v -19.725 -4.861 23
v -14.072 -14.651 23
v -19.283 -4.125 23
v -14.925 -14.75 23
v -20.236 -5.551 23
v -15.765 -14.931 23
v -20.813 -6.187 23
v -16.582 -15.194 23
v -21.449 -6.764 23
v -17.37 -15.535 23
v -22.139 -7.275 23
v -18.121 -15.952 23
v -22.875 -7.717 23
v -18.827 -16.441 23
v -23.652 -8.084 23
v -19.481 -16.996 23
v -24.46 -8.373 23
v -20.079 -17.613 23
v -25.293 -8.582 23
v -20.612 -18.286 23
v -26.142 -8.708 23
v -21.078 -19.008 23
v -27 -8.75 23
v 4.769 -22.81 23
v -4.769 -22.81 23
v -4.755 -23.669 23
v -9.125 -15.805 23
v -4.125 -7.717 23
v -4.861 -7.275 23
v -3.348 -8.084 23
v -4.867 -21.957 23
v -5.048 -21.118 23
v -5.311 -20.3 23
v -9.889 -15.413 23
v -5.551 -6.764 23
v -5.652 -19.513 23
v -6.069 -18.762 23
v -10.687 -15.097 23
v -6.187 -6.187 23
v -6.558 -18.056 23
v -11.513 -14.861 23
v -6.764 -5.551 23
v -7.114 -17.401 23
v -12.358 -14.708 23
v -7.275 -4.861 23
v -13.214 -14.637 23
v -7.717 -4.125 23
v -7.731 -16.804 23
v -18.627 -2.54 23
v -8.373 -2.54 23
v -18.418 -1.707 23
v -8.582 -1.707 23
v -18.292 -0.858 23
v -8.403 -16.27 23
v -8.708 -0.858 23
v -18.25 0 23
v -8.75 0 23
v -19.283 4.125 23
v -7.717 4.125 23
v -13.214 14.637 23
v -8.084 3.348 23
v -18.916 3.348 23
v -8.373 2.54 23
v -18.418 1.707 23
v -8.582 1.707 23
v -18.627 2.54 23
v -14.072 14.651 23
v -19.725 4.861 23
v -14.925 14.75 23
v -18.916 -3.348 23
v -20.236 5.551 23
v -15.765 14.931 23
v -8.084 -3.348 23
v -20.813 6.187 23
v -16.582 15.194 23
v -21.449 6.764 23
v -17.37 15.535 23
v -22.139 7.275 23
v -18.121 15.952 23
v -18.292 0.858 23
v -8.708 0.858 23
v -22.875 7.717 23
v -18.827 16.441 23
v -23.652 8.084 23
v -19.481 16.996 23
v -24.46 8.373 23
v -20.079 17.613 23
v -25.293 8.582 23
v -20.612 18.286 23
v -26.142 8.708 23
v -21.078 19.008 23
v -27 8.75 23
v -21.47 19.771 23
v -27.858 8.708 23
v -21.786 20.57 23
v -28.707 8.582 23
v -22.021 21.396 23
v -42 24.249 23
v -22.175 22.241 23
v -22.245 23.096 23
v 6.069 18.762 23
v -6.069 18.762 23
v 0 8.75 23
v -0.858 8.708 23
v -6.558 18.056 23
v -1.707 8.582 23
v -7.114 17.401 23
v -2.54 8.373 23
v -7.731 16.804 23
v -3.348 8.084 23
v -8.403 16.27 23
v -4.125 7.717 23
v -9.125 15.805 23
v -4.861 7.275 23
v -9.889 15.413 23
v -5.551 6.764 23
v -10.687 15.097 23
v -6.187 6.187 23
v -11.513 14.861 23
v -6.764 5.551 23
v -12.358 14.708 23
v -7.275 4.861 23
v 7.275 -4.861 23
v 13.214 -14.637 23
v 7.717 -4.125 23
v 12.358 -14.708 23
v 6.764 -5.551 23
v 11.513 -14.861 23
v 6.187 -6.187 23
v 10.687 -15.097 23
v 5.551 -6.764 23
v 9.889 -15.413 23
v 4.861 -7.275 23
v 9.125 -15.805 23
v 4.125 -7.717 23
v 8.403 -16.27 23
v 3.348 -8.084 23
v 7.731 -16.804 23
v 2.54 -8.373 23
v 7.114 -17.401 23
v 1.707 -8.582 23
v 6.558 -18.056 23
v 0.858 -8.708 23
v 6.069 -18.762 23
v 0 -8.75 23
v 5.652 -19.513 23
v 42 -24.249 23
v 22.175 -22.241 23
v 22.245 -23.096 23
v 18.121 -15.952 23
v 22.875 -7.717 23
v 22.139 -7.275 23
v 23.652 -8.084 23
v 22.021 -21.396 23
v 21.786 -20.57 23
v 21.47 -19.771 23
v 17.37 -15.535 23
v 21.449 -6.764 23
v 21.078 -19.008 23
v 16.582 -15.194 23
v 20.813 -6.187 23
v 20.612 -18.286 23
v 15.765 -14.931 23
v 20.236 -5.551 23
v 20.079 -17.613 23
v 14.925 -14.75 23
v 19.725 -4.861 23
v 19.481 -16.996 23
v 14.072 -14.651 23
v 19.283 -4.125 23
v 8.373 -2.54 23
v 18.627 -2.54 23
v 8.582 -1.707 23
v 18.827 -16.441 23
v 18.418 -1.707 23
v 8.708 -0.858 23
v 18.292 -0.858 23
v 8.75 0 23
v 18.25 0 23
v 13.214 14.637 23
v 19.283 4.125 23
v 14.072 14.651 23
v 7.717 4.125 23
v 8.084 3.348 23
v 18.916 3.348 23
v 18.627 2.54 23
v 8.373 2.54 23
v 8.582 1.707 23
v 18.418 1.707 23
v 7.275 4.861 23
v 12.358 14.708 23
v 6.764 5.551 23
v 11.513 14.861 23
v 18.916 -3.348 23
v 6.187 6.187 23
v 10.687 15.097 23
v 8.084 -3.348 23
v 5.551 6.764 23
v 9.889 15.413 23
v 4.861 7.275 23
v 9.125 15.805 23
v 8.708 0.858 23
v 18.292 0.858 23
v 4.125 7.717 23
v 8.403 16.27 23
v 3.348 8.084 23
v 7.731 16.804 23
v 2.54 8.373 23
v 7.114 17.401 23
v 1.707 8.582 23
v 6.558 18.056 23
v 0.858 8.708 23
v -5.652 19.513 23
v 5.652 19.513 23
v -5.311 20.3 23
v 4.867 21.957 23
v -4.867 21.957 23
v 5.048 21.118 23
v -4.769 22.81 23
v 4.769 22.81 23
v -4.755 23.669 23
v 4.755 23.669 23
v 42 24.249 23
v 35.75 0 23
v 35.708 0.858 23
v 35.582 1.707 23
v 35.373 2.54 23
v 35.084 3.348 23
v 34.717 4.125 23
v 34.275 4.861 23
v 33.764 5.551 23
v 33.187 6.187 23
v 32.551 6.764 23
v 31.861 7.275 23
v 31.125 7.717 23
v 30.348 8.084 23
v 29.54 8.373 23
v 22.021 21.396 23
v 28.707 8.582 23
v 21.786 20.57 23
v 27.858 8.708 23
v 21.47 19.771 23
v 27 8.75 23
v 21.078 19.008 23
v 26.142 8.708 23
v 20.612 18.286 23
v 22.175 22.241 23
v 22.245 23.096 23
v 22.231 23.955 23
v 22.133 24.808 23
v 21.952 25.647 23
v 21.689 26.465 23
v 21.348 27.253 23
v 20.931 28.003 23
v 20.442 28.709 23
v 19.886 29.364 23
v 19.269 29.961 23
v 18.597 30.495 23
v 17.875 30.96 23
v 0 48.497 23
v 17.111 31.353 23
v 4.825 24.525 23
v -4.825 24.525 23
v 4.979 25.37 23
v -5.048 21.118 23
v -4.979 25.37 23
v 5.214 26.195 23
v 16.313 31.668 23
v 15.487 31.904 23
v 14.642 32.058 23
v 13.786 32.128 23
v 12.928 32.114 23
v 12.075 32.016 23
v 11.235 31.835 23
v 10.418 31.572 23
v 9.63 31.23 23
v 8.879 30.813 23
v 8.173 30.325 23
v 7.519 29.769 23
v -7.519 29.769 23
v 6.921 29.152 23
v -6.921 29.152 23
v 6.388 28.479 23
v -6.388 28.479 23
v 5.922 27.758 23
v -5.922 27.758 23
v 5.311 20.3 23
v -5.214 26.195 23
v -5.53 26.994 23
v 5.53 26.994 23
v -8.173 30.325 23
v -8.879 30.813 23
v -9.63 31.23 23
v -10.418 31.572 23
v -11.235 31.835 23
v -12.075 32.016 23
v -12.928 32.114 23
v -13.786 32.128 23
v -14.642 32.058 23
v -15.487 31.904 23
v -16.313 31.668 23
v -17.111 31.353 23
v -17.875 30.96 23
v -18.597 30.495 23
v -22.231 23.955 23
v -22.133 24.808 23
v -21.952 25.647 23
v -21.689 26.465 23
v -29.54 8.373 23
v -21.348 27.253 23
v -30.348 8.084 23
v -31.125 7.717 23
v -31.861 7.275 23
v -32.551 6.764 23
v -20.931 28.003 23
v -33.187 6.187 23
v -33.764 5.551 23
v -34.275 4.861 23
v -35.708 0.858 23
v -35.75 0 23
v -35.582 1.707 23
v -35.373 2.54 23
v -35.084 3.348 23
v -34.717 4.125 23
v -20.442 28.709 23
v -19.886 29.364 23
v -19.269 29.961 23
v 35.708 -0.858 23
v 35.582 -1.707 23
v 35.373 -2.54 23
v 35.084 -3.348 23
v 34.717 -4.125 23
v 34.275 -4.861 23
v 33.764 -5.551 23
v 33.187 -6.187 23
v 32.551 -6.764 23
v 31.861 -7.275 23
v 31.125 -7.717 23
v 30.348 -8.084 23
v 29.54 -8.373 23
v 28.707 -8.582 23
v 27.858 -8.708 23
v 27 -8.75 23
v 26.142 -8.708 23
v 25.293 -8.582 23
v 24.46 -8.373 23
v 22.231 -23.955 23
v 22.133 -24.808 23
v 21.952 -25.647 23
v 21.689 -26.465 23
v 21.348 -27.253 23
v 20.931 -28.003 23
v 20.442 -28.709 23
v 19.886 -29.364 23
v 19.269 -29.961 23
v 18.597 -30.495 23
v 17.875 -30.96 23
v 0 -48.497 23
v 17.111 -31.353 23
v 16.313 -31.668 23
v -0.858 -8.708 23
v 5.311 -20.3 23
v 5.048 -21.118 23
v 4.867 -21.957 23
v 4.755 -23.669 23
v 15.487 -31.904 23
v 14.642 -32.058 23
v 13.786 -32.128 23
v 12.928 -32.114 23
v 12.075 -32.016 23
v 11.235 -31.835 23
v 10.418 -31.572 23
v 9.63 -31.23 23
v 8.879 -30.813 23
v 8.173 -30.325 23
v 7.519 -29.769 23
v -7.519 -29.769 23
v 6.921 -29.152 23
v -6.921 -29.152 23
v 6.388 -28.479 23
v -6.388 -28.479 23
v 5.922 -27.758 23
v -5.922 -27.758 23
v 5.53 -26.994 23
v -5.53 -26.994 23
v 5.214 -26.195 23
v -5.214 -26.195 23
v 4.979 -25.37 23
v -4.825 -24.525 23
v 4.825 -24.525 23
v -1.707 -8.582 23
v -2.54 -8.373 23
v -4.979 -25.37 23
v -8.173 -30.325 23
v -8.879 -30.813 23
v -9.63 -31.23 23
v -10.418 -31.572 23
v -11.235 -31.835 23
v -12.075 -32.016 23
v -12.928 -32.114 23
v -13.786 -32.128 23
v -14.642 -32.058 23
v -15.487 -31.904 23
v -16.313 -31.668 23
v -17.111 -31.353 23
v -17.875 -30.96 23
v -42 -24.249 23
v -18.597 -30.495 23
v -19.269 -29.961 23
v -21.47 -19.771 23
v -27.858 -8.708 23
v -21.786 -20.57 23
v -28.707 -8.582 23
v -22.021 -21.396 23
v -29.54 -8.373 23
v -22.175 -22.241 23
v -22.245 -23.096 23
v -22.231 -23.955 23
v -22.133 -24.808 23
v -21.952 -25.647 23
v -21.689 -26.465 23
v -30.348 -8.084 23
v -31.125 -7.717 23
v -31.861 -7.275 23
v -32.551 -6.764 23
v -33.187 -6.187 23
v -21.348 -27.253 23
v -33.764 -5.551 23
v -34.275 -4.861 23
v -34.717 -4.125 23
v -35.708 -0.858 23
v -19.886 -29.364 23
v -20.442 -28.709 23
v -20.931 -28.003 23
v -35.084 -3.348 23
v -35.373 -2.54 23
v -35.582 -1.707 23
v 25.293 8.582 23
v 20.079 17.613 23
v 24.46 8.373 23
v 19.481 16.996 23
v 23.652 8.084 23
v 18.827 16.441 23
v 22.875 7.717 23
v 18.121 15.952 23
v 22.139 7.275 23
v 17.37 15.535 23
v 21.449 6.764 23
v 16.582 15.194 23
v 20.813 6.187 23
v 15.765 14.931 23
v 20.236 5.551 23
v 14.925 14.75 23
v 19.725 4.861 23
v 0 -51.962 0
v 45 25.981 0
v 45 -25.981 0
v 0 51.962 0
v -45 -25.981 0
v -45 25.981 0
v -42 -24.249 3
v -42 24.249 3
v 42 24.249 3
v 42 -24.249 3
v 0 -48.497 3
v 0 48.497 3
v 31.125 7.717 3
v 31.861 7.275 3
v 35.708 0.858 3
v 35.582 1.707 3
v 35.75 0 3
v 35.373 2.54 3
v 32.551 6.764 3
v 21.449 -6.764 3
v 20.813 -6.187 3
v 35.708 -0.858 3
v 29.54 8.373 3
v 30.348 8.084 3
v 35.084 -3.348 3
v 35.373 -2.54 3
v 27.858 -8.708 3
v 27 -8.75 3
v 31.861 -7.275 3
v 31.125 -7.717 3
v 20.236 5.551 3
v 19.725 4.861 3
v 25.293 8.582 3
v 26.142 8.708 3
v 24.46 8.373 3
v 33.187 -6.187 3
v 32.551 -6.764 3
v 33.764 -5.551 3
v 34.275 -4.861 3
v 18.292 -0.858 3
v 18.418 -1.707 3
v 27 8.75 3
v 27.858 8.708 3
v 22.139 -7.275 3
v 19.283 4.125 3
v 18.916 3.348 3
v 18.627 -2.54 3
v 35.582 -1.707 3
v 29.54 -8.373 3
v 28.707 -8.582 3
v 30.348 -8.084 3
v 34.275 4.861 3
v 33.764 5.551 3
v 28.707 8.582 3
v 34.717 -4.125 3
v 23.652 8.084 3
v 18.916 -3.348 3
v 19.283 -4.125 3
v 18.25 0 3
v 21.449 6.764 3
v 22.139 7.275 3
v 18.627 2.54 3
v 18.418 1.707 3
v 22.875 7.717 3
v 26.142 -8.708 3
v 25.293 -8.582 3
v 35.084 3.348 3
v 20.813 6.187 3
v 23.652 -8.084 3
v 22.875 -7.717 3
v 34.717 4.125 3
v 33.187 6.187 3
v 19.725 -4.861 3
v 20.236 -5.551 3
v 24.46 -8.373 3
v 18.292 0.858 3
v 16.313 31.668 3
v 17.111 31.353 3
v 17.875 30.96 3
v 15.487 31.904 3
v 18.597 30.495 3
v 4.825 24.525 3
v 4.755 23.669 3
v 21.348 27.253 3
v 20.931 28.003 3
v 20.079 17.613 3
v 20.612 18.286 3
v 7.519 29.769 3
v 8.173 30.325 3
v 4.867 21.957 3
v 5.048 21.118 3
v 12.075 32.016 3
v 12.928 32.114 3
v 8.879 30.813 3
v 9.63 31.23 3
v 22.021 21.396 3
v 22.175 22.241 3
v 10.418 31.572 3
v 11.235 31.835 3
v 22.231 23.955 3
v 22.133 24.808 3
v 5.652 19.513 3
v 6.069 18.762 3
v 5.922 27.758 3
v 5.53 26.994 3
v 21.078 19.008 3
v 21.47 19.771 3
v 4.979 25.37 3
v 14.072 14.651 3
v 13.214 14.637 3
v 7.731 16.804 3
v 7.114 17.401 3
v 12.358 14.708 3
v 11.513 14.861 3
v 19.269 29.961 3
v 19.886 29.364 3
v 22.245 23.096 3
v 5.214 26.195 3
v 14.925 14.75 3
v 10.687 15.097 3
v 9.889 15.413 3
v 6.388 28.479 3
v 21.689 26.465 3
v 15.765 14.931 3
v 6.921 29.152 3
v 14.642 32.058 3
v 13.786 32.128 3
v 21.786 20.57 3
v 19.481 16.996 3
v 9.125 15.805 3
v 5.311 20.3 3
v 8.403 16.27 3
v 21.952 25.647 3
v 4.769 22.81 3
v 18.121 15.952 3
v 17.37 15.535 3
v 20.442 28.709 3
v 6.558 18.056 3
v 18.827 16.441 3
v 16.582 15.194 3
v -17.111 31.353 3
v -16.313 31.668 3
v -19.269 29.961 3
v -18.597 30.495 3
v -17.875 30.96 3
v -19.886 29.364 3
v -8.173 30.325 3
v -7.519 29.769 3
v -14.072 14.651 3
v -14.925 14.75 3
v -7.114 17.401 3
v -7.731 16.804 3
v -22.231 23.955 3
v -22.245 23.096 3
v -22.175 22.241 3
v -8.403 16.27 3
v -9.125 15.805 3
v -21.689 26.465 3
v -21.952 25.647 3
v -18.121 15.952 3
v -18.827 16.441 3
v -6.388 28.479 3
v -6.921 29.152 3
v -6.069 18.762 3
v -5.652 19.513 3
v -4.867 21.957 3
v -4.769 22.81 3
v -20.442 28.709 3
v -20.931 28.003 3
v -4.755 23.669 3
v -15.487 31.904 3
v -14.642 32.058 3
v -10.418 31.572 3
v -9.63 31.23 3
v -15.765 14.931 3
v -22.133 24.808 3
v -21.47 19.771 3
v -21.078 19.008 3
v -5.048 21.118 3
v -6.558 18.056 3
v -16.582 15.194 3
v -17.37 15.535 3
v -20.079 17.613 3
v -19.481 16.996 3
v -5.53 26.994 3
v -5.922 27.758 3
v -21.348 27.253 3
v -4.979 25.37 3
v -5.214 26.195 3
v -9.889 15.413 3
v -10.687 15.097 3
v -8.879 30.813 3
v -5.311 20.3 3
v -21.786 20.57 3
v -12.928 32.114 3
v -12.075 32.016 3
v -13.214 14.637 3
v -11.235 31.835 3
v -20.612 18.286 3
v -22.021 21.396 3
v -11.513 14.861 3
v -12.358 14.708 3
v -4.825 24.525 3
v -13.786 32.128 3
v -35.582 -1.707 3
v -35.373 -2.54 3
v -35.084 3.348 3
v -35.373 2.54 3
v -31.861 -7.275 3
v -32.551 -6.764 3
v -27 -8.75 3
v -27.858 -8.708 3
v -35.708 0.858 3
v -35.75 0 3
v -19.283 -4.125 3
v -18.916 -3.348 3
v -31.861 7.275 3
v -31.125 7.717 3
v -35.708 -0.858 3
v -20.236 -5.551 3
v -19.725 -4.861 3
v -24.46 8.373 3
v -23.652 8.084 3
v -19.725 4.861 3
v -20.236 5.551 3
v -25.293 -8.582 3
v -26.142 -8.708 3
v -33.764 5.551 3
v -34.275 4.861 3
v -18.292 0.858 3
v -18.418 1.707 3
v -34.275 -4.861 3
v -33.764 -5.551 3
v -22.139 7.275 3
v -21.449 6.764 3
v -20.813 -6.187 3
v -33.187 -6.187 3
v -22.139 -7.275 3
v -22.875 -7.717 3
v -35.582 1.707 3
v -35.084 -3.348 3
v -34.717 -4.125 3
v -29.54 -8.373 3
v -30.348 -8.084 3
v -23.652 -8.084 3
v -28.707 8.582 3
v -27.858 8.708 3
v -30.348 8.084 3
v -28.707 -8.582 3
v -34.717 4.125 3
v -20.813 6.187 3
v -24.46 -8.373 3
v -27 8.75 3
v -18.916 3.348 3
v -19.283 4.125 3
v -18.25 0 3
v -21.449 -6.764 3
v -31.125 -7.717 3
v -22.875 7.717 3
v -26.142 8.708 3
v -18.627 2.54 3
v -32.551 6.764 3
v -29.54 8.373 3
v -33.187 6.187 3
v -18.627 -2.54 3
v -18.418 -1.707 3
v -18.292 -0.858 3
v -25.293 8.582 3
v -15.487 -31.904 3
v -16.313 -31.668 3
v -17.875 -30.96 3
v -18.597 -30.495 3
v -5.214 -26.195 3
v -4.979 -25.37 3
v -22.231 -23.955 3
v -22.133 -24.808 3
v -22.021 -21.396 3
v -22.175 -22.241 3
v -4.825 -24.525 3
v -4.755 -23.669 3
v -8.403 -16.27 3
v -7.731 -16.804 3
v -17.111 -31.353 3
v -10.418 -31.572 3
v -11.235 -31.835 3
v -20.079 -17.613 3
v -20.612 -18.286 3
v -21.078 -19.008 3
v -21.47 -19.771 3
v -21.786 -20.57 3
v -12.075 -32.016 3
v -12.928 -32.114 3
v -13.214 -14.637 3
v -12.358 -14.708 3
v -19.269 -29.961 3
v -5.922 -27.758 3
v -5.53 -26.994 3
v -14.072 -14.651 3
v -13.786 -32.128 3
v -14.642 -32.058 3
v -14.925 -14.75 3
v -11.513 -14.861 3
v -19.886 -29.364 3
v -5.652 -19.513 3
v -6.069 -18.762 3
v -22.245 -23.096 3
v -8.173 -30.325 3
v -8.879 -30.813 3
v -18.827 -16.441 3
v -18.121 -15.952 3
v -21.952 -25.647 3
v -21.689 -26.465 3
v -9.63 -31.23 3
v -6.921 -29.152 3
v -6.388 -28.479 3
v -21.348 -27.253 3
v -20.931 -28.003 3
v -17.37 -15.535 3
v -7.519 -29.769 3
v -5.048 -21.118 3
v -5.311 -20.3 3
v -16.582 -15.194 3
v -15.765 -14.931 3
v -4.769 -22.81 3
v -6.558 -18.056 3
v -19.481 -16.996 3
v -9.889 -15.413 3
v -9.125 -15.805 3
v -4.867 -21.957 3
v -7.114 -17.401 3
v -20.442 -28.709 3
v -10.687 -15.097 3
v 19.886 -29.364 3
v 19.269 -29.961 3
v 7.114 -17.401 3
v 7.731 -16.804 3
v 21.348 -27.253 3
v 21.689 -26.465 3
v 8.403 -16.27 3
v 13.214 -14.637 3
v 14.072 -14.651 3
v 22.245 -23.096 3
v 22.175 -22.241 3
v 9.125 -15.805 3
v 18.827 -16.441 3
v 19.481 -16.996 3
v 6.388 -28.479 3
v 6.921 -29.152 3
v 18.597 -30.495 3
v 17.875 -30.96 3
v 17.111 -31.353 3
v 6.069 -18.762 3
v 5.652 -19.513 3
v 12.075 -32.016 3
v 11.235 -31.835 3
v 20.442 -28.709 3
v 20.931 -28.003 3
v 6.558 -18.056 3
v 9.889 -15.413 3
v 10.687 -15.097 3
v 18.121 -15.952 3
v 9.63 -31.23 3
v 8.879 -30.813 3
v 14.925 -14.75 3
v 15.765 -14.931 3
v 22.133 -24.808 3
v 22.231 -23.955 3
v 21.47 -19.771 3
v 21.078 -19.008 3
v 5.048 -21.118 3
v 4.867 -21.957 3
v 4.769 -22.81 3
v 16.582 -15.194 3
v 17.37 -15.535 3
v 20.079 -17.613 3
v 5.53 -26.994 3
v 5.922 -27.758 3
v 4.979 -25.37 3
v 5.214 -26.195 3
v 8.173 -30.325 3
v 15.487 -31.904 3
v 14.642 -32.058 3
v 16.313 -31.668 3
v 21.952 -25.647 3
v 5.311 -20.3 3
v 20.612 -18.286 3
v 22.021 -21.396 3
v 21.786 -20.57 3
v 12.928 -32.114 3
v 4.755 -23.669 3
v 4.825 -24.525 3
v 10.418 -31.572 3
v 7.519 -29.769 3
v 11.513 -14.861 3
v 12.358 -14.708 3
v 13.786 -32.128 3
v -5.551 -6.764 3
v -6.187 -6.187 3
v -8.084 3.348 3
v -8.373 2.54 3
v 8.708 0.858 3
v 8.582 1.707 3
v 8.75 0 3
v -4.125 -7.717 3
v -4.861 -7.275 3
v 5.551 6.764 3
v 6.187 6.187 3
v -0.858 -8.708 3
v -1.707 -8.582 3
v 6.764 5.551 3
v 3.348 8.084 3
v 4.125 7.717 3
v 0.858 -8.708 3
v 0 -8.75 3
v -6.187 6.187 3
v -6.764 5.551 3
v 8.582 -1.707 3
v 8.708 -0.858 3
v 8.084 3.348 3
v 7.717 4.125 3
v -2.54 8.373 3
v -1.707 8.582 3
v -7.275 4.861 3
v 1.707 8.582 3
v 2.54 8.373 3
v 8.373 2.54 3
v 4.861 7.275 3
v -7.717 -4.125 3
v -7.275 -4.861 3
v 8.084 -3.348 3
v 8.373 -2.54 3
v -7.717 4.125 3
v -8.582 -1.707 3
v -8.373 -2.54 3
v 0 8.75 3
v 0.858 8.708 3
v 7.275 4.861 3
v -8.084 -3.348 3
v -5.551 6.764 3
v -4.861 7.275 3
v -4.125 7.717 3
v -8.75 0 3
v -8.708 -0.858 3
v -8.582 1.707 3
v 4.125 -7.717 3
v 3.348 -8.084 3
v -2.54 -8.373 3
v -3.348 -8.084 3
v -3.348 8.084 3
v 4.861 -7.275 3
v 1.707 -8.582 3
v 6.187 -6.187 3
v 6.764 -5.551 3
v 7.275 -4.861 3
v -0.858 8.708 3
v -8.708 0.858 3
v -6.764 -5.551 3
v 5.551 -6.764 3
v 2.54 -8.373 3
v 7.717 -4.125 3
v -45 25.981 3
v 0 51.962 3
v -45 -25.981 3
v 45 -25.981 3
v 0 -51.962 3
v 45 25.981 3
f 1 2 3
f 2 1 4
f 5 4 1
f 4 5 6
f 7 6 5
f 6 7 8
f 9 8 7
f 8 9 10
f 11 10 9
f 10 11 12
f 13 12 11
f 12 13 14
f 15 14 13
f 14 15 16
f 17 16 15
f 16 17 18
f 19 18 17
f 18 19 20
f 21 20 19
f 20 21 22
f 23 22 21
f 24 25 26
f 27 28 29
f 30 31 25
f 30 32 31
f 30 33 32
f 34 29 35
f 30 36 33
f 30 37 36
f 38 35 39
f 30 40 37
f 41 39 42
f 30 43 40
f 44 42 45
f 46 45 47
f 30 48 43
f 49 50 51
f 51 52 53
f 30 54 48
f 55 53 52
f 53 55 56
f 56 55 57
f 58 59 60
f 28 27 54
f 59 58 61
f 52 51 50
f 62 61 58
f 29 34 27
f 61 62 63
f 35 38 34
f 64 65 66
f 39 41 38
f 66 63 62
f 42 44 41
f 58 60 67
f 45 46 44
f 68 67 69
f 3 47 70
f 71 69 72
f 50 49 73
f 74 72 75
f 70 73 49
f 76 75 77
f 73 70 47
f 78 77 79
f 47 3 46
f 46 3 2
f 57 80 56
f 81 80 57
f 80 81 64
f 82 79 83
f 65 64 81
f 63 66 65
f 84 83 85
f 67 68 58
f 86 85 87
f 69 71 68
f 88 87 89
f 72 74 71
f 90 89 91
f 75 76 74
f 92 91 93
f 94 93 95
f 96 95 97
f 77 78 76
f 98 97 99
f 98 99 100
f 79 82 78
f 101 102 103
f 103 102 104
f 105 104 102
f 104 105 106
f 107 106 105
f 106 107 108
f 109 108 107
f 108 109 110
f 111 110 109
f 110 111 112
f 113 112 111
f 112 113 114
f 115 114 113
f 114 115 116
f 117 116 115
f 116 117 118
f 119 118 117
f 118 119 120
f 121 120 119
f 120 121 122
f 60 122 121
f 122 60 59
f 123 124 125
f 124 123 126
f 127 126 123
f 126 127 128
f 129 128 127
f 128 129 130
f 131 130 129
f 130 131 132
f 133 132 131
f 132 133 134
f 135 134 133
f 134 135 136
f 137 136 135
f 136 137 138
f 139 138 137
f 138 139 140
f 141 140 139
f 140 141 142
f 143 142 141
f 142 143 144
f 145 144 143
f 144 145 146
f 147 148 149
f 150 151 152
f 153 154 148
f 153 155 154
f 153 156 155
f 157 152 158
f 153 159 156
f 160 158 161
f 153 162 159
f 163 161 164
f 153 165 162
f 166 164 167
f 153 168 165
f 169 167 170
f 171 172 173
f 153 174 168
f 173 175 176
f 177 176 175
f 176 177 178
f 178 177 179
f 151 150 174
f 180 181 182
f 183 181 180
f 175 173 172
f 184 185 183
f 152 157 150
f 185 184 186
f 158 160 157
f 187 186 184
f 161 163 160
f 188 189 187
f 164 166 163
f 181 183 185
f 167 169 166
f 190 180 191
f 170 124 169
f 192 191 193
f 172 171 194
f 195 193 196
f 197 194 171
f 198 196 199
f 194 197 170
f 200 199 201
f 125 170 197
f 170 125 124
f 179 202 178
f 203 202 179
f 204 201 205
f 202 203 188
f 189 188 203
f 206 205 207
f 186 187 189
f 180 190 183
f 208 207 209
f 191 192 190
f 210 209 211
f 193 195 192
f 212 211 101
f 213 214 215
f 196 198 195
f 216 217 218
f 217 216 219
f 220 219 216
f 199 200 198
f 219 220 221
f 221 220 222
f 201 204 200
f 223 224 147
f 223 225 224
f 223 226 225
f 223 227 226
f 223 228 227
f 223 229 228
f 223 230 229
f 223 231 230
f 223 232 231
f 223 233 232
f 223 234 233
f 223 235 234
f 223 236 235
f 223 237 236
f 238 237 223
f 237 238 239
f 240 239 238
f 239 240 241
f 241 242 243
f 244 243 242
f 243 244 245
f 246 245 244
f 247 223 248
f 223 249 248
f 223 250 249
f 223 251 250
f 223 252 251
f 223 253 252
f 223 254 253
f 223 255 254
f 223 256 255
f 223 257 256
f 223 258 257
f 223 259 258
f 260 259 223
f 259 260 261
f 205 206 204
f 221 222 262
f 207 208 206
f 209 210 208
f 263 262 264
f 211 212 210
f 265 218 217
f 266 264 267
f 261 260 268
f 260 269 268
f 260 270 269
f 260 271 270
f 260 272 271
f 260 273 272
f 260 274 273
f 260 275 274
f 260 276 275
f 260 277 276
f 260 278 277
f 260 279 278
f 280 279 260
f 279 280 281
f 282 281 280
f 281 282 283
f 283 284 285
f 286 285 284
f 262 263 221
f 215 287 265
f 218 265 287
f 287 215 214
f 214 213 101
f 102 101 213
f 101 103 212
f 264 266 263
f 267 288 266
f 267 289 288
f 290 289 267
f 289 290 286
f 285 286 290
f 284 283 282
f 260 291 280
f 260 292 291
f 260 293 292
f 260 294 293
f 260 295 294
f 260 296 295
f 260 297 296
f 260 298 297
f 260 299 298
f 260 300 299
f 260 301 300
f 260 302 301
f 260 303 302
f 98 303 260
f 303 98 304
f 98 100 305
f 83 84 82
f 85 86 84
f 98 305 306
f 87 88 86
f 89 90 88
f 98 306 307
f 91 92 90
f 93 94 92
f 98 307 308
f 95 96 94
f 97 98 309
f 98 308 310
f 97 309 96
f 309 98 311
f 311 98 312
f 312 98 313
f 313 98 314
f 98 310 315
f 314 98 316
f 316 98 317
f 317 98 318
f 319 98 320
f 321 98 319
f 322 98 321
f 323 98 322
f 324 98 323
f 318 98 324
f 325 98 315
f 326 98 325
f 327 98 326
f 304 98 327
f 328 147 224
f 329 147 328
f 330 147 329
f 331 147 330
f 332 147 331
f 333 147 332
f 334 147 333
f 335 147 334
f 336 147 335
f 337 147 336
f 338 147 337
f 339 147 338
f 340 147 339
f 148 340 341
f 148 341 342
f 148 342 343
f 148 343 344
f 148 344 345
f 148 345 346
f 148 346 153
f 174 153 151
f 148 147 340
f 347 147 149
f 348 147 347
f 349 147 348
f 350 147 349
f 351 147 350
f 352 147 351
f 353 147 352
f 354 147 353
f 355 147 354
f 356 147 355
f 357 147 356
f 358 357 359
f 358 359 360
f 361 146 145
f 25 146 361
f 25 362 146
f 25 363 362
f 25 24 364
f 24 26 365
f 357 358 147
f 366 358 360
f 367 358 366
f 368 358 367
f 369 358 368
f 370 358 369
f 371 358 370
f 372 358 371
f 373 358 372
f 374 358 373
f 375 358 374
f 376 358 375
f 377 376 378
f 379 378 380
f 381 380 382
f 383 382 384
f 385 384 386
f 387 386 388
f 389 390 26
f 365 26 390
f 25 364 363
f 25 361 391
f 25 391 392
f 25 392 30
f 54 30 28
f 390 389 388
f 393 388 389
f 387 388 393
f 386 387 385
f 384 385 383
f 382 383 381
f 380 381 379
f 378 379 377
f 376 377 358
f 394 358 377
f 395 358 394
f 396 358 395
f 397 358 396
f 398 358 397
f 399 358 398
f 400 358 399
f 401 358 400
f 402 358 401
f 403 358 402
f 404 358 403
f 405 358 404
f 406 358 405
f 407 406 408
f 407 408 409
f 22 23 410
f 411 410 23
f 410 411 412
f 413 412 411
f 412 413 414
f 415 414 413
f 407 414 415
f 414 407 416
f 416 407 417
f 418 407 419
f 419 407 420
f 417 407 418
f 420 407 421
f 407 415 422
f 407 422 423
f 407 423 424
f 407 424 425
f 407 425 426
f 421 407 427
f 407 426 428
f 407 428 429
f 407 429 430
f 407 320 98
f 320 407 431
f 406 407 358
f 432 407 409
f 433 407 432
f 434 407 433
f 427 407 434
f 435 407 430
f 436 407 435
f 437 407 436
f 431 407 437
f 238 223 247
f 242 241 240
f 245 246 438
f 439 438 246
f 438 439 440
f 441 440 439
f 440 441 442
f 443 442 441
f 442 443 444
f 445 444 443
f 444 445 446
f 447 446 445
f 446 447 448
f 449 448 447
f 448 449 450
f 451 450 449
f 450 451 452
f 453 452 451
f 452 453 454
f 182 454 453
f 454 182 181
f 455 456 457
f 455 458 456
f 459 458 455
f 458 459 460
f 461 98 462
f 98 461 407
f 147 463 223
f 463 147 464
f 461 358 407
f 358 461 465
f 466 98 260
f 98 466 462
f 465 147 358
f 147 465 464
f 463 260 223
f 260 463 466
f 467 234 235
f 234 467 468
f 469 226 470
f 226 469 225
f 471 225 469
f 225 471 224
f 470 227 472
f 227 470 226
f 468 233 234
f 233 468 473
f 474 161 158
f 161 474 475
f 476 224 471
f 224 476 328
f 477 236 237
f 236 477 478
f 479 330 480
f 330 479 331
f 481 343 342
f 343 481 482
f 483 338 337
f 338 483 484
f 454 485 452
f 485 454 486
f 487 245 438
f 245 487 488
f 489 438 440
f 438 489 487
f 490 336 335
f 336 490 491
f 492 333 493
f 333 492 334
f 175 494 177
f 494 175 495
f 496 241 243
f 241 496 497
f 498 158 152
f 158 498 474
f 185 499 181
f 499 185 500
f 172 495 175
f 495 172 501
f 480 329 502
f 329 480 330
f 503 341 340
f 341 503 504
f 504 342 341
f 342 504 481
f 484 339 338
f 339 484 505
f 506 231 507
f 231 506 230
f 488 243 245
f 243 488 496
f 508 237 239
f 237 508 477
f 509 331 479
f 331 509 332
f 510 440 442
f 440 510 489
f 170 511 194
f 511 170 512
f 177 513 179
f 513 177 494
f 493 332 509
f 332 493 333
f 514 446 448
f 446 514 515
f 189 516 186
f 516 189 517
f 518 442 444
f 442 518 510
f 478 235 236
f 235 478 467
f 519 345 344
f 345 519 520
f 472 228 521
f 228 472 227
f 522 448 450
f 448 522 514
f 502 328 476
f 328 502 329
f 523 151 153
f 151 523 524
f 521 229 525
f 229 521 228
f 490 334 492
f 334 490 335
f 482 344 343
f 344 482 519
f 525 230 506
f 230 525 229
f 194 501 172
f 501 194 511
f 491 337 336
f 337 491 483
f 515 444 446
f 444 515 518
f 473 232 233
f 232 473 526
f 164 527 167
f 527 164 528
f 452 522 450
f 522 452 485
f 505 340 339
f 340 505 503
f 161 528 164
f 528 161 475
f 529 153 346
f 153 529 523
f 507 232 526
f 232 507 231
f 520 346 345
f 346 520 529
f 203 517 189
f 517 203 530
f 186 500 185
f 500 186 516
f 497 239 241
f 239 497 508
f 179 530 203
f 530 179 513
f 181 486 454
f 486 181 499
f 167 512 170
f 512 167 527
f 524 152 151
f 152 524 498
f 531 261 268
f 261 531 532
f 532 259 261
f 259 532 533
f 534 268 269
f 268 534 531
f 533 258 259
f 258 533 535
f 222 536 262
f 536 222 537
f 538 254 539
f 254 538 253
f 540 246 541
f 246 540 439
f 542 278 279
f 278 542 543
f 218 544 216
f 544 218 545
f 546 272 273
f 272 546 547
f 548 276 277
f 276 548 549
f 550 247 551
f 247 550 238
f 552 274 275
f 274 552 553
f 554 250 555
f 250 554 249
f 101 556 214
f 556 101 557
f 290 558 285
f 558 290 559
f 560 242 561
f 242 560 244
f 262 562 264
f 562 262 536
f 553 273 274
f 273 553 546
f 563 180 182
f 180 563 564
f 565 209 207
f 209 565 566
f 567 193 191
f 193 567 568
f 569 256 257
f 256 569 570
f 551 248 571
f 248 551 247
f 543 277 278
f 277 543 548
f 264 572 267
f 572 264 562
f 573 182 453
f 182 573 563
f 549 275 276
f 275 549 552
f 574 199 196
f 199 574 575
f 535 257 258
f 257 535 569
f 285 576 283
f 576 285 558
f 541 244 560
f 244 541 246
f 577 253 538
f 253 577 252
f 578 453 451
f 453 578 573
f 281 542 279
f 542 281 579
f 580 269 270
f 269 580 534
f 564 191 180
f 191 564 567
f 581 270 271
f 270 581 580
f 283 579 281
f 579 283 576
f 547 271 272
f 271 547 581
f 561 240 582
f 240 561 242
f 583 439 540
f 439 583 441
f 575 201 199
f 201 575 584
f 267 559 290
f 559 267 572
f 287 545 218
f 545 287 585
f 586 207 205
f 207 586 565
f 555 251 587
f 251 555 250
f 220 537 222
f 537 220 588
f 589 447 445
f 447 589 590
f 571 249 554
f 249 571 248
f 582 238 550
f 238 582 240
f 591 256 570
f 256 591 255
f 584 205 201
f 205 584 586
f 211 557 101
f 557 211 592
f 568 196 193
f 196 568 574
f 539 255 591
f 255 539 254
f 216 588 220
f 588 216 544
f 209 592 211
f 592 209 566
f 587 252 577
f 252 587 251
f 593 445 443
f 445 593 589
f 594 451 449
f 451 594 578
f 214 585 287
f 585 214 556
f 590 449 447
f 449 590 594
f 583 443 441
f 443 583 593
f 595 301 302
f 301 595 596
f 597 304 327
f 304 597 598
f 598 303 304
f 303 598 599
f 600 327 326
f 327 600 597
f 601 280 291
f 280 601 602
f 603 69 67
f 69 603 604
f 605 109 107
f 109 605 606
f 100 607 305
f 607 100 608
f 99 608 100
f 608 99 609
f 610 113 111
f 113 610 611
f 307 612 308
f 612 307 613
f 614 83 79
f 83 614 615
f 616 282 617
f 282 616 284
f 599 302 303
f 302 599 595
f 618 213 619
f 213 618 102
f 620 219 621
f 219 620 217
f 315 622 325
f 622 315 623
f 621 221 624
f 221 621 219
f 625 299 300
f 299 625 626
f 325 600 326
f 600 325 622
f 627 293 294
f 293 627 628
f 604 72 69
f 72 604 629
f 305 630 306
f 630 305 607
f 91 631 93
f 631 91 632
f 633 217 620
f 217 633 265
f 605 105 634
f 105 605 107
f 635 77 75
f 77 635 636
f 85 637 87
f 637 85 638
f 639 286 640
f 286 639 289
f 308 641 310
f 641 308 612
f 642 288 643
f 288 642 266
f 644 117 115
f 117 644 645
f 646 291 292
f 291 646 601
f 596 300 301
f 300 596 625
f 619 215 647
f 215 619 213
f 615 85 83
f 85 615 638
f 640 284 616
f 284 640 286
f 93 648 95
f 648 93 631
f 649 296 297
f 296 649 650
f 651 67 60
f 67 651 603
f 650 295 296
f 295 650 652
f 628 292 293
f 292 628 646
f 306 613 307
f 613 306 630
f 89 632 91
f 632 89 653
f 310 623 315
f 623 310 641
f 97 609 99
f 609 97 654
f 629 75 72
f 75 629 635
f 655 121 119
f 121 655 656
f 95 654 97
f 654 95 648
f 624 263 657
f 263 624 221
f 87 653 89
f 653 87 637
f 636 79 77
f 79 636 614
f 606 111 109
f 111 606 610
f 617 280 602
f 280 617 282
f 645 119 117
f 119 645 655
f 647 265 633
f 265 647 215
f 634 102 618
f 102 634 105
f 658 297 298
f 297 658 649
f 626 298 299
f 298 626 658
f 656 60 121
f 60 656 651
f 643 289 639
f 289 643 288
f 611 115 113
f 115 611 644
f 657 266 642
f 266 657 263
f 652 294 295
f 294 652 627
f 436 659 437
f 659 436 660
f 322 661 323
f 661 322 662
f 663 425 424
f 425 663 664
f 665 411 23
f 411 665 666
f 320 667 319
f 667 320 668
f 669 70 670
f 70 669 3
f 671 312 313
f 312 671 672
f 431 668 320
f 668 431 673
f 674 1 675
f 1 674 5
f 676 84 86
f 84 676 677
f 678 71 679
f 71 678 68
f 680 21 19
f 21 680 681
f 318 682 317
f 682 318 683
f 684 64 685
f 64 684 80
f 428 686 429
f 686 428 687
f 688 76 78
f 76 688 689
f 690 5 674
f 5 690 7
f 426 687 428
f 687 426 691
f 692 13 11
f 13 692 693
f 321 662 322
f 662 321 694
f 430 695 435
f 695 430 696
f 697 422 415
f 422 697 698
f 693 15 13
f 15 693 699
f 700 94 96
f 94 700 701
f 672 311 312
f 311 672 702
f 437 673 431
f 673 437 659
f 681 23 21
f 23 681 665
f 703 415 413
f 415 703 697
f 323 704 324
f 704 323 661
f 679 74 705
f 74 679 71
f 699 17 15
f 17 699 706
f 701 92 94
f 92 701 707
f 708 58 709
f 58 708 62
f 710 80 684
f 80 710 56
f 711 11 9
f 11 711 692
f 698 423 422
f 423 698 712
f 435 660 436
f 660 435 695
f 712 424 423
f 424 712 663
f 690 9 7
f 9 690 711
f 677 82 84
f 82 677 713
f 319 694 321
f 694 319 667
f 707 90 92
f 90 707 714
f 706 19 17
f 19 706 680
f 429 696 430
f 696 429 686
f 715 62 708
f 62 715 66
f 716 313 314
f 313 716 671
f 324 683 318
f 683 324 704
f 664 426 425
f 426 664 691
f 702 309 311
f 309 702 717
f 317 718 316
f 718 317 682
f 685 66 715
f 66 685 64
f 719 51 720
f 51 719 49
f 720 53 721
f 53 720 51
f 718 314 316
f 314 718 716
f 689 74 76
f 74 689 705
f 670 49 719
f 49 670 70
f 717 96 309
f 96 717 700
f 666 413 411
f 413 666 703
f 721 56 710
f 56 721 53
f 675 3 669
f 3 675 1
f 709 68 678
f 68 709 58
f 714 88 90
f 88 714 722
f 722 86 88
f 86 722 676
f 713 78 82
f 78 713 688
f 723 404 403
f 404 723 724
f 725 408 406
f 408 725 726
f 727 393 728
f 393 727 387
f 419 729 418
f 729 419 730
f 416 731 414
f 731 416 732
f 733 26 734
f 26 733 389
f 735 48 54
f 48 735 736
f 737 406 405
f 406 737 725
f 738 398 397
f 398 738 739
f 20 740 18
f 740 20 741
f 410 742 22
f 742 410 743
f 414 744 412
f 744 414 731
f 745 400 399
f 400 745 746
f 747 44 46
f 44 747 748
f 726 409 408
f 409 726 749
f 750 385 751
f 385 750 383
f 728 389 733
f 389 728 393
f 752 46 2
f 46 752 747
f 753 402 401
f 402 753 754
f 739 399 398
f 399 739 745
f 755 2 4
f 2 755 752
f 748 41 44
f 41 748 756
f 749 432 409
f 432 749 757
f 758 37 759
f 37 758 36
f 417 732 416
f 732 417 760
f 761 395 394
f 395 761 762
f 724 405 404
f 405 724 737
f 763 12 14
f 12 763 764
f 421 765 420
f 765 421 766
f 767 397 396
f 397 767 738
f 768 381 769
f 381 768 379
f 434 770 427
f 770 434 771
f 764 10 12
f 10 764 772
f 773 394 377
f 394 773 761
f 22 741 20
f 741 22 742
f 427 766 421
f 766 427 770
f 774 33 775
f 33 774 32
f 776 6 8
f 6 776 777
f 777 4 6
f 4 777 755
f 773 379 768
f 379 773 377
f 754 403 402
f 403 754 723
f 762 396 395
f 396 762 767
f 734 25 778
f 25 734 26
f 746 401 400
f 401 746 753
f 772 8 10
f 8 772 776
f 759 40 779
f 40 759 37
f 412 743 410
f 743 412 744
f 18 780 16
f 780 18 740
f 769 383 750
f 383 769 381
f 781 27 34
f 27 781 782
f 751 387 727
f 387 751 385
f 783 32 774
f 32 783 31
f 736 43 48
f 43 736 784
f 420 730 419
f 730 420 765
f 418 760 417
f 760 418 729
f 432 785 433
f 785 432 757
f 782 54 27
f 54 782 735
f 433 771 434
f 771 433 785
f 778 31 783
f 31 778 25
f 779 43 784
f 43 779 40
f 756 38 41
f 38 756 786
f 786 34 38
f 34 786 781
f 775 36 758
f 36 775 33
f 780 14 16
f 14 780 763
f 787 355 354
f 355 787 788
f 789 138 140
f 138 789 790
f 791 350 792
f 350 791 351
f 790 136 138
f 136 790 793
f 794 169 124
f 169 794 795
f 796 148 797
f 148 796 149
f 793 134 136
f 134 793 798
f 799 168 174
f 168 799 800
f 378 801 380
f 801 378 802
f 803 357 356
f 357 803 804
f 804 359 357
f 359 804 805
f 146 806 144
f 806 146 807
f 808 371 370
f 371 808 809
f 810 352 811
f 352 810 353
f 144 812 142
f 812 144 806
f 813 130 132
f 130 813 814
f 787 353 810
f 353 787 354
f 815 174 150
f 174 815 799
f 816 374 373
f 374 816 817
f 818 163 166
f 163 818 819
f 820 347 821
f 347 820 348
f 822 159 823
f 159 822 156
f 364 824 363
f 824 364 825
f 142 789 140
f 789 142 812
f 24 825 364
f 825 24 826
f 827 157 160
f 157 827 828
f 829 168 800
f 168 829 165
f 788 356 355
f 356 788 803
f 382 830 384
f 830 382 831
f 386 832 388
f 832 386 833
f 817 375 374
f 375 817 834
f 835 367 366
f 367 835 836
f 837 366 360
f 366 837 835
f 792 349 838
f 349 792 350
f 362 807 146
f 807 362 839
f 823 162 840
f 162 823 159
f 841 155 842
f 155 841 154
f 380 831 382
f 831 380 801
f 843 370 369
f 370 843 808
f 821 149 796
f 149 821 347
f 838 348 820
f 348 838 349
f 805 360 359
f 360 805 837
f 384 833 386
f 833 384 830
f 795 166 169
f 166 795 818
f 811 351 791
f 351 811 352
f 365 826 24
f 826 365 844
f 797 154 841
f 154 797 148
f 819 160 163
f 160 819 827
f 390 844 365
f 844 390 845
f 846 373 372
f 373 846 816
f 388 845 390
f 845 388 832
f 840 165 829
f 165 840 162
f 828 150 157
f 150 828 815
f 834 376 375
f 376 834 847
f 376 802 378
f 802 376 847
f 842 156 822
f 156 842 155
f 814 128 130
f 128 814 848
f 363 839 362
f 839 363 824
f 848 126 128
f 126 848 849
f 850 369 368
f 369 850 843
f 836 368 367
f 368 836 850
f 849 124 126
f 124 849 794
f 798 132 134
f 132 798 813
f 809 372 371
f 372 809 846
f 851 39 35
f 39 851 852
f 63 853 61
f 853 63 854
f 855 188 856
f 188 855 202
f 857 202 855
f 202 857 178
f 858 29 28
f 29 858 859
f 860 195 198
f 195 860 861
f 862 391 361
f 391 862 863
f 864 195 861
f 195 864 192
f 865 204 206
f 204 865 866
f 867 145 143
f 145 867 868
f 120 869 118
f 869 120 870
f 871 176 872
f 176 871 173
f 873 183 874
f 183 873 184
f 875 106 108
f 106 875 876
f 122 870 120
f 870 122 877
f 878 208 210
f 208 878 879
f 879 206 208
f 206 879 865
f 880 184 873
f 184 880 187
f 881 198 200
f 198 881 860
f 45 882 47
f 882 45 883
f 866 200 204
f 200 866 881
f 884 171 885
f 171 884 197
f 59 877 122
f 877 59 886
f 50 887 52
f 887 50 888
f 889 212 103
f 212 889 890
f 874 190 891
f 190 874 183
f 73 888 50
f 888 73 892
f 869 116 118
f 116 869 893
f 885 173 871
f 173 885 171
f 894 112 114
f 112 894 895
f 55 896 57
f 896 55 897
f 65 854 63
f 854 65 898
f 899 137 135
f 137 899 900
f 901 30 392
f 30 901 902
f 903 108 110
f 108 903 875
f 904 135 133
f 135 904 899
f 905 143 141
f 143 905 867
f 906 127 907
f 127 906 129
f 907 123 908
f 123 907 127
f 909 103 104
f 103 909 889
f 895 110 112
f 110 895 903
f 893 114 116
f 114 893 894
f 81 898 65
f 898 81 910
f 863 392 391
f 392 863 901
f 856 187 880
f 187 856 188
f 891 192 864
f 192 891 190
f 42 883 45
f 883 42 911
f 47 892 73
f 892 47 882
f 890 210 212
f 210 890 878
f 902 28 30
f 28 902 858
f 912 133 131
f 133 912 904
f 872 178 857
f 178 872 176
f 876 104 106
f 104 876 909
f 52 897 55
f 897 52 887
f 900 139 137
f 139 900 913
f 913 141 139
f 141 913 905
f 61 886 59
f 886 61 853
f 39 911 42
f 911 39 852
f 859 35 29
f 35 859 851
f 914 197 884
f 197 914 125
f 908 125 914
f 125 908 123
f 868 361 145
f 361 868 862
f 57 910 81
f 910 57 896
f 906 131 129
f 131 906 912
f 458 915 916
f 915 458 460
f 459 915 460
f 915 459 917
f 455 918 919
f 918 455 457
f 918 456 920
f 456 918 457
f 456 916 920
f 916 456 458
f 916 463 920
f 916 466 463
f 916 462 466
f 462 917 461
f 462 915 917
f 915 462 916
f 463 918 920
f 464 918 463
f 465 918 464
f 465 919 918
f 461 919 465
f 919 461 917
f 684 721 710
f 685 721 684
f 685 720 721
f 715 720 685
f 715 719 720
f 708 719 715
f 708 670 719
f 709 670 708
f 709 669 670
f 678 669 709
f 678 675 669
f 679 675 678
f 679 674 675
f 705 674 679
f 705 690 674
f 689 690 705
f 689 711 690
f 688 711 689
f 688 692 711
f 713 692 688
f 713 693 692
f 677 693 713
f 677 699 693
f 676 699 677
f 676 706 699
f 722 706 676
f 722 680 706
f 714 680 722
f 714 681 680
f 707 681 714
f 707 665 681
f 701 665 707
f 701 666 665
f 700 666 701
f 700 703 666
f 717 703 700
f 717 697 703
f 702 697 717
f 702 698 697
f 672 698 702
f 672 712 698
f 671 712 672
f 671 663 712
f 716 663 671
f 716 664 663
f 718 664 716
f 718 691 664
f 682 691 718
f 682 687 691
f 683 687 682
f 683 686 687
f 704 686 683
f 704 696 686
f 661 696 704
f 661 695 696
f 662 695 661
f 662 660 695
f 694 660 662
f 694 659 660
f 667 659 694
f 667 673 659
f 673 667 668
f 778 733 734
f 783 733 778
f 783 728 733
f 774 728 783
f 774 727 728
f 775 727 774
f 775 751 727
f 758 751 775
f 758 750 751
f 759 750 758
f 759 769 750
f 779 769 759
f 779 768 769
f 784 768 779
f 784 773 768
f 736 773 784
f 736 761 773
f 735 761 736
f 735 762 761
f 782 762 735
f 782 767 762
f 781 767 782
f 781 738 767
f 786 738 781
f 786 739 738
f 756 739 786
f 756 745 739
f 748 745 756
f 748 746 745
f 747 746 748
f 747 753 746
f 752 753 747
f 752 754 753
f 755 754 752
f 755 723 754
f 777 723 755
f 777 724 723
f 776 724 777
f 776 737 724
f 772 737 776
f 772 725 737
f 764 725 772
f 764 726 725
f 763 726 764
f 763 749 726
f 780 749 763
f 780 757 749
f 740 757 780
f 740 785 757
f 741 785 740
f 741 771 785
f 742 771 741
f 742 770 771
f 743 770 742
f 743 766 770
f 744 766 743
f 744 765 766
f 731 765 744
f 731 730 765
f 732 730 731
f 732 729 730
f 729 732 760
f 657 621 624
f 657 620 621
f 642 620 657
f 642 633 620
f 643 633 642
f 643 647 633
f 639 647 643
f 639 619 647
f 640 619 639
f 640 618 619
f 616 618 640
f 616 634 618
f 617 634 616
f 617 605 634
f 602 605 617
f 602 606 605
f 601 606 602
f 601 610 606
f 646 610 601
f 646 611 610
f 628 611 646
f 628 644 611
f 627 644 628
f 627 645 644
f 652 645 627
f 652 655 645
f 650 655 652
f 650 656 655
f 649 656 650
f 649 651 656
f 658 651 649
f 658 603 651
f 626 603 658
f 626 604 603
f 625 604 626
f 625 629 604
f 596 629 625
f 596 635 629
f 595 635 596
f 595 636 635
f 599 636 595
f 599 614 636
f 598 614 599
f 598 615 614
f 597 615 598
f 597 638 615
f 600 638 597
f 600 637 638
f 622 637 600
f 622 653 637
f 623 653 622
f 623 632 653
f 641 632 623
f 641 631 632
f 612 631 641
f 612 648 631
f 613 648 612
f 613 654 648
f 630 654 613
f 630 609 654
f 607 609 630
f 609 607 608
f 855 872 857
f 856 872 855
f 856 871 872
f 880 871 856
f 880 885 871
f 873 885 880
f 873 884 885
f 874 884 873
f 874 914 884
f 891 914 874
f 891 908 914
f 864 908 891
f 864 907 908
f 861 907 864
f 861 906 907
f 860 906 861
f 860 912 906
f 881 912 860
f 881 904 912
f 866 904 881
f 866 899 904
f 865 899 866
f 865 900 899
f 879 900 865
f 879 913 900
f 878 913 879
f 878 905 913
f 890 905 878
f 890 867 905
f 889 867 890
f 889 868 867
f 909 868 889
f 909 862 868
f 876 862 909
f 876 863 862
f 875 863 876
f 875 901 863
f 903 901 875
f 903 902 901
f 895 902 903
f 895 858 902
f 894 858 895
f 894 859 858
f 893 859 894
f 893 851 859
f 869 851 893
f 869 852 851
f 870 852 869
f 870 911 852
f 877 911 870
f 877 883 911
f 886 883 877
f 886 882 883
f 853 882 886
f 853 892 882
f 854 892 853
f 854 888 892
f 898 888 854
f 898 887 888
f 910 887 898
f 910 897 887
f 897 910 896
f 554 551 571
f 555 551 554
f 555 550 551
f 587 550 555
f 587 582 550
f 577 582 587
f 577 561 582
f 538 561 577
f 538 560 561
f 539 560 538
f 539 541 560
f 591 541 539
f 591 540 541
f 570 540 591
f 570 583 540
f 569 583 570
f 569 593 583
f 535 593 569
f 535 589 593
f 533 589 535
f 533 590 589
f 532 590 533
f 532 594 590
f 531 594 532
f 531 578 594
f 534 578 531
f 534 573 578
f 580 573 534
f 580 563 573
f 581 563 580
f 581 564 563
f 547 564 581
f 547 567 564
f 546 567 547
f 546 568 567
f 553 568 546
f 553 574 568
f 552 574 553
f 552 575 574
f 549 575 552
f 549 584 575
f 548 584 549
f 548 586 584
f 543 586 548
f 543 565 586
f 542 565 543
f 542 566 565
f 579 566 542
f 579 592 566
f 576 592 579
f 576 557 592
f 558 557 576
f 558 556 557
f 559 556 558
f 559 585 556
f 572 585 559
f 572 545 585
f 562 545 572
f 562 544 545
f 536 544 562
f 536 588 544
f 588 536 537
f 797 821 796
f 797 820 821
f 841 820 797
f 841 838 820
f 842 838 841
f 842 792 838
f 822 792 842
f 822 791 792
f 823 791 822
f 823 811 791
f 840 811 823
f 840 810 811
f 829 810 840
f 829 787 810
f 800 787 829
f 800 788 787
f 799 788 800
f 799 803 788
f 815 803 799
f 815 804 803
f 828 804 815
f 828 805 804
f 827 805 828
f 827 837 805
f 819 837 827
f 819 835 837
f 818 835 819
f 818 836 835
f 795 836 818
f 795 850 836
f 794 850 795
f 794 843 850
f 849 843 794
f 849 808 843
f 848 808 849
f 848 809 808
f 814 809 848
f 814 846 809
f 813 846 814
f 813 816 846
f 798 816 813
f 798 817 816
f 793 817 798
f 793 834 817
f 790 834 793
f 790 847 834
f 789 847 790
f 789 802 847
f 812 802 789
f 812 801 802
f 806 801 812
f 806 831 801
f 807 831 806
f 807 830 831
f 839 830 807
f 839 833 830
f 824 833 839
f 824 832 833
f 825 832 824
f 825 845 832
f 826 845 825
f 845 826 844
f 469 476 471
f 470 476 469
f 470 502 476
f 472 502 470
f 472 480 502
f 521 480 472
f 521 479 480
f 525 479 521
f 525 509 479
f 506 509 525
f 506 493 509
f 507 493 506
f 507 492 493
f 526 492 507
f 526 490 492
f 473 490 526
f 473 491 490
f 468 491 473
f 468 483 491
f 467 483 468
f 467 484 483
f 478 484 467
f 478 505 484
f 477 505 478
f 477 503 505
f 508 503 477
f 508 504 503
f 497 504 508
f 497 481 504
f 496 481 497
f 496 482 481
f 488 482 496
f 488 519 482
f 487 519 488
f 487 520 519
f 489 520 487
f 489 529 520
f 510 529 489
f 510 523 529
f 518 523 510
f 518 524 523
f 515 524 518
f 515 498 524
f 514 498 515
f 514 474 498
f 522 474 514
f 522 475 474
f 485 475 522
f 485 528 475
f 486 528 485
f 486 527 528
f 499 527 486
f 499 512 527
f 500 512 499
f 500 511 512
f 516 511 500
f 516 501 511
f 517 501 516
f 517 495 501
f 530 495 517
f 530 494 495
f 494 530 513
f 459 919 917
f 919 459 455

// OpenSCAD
// Float for seven 15 mL conical tubes
// Designed to be printed upside down (flat plate at z=0)

// --- Dimensions ---
plate_across_flats = 90.0; // Distance between parallel sides of the hexagonal plate
plate_thickness    = 3.0;  // Thickness of the base plate
tube_hole_d        = 17.5; // Diameter of the conical tube holes
tube_sleeve_od     = 21.5; // Outside diameter of the sleeves
tube_sleeve_wall   = 2.0;  // Wall thickness of the sleeves
tube_sleeve_h      = 20.0; // Height of the sleeves and skirt

circle_dia         = 54.0; // Diameter of the circle of holes
skirt_across_flats  = 84.0; // Distance between parallel sides of the hexagonal skirt
skirt_wall         = 2.0;  // Wall thickness of the skirt

$fn = 64;

// --- Helper Modules ---

// Generates a regular hexagon based on "across flats" dimension
// To ensure flats are parallel to X, we define the polygon such that 
// the distance between top and bottom edges is d_flats.
module hexagon_flat(d_flats, height) {
    // Apothem (distance from center to midpoint of side) is d_flats / 2
    // Radius to vertex R = apothem / cos(30)
    r_vertex = (d_flats / 2) / cos(30);
    
    linear_extrude(height = height)
    // To have flats parallel to X, the vertices should be at 30, 90, 150...
    // This places the midpoints of the sides at 0, 60, 120... (on the X axis)
    // Wait, if midpoints are on X axis, flats are parallel to Y.
    // To have flats parallel to X, midpoints must be at 90, 270...
    // So we rotate the standard polygon by 30 degrees.
    rotate([0, 0, 30])
    polygon(points = [
        [r_vertex * cos(0),   r_vertex * sin(0)],
        [r_vertex * cos(60),  r_vertex * sin(60)],
        [r_vertex * cos(120), r_vertex * sin(120)],
        [r_vertex * cos(180), r_vertex * sin(180)],
        [r_vertex * cos(240), r_vertex * sin(240)],
        [r_vertex * cos(300), r_vertex * sin(300)]
    ]);
}

// --- Main Construction ---

union() {
    // 1. The Base Plate
    // The hexagon_flat module already includes the 30 deg rotation to ensure 
    // the flats are parallel to the X axis.
    hexagon_flat(plate_across_flats, plate_thickness);

    // 2. The Sleeves and Skirt
    difference() {
        union() {
            // The Hexagonal Skirt
            hexagon_flat(skirt_across_flats, tube_sleeve_h + plate_thickness);

            // The Seven Sleeves
            // Center sleeve
            cylinder(h = tube_sleeve_h + plate_thickness, d = tube_sleeve_od);

            // Six peripheral sleeves
            for (i = [0 : 5]) {
                angle = i * 60;
                // The first hole is on the +X axis (0 degrees)
                rotate([0, 0, angle])
                translate([circle_dia / 2, 0, 0])
                cylinder(h = tube_sleeve_h + plate_thickness, d = tube_sleeve_od);
            }
        }

        // 3. The Holes
        // Center hole
        translate([0, 0, -0.01])
        cylinder(h = plate_thickness + tube_sleeve_h + 0.02, d = tube_hole_d);

        // Peripheral holes
        for (i = [0 : 5]) {
            angle = i * 60;
            rotate([0, 0, angle])
            translate([circle_dia / 2, 0, -0.01])
            cylinder(h = plate_thickness + tube_sleeve_h + 0.02, d = tube_hole_d);
        }
    }
}
